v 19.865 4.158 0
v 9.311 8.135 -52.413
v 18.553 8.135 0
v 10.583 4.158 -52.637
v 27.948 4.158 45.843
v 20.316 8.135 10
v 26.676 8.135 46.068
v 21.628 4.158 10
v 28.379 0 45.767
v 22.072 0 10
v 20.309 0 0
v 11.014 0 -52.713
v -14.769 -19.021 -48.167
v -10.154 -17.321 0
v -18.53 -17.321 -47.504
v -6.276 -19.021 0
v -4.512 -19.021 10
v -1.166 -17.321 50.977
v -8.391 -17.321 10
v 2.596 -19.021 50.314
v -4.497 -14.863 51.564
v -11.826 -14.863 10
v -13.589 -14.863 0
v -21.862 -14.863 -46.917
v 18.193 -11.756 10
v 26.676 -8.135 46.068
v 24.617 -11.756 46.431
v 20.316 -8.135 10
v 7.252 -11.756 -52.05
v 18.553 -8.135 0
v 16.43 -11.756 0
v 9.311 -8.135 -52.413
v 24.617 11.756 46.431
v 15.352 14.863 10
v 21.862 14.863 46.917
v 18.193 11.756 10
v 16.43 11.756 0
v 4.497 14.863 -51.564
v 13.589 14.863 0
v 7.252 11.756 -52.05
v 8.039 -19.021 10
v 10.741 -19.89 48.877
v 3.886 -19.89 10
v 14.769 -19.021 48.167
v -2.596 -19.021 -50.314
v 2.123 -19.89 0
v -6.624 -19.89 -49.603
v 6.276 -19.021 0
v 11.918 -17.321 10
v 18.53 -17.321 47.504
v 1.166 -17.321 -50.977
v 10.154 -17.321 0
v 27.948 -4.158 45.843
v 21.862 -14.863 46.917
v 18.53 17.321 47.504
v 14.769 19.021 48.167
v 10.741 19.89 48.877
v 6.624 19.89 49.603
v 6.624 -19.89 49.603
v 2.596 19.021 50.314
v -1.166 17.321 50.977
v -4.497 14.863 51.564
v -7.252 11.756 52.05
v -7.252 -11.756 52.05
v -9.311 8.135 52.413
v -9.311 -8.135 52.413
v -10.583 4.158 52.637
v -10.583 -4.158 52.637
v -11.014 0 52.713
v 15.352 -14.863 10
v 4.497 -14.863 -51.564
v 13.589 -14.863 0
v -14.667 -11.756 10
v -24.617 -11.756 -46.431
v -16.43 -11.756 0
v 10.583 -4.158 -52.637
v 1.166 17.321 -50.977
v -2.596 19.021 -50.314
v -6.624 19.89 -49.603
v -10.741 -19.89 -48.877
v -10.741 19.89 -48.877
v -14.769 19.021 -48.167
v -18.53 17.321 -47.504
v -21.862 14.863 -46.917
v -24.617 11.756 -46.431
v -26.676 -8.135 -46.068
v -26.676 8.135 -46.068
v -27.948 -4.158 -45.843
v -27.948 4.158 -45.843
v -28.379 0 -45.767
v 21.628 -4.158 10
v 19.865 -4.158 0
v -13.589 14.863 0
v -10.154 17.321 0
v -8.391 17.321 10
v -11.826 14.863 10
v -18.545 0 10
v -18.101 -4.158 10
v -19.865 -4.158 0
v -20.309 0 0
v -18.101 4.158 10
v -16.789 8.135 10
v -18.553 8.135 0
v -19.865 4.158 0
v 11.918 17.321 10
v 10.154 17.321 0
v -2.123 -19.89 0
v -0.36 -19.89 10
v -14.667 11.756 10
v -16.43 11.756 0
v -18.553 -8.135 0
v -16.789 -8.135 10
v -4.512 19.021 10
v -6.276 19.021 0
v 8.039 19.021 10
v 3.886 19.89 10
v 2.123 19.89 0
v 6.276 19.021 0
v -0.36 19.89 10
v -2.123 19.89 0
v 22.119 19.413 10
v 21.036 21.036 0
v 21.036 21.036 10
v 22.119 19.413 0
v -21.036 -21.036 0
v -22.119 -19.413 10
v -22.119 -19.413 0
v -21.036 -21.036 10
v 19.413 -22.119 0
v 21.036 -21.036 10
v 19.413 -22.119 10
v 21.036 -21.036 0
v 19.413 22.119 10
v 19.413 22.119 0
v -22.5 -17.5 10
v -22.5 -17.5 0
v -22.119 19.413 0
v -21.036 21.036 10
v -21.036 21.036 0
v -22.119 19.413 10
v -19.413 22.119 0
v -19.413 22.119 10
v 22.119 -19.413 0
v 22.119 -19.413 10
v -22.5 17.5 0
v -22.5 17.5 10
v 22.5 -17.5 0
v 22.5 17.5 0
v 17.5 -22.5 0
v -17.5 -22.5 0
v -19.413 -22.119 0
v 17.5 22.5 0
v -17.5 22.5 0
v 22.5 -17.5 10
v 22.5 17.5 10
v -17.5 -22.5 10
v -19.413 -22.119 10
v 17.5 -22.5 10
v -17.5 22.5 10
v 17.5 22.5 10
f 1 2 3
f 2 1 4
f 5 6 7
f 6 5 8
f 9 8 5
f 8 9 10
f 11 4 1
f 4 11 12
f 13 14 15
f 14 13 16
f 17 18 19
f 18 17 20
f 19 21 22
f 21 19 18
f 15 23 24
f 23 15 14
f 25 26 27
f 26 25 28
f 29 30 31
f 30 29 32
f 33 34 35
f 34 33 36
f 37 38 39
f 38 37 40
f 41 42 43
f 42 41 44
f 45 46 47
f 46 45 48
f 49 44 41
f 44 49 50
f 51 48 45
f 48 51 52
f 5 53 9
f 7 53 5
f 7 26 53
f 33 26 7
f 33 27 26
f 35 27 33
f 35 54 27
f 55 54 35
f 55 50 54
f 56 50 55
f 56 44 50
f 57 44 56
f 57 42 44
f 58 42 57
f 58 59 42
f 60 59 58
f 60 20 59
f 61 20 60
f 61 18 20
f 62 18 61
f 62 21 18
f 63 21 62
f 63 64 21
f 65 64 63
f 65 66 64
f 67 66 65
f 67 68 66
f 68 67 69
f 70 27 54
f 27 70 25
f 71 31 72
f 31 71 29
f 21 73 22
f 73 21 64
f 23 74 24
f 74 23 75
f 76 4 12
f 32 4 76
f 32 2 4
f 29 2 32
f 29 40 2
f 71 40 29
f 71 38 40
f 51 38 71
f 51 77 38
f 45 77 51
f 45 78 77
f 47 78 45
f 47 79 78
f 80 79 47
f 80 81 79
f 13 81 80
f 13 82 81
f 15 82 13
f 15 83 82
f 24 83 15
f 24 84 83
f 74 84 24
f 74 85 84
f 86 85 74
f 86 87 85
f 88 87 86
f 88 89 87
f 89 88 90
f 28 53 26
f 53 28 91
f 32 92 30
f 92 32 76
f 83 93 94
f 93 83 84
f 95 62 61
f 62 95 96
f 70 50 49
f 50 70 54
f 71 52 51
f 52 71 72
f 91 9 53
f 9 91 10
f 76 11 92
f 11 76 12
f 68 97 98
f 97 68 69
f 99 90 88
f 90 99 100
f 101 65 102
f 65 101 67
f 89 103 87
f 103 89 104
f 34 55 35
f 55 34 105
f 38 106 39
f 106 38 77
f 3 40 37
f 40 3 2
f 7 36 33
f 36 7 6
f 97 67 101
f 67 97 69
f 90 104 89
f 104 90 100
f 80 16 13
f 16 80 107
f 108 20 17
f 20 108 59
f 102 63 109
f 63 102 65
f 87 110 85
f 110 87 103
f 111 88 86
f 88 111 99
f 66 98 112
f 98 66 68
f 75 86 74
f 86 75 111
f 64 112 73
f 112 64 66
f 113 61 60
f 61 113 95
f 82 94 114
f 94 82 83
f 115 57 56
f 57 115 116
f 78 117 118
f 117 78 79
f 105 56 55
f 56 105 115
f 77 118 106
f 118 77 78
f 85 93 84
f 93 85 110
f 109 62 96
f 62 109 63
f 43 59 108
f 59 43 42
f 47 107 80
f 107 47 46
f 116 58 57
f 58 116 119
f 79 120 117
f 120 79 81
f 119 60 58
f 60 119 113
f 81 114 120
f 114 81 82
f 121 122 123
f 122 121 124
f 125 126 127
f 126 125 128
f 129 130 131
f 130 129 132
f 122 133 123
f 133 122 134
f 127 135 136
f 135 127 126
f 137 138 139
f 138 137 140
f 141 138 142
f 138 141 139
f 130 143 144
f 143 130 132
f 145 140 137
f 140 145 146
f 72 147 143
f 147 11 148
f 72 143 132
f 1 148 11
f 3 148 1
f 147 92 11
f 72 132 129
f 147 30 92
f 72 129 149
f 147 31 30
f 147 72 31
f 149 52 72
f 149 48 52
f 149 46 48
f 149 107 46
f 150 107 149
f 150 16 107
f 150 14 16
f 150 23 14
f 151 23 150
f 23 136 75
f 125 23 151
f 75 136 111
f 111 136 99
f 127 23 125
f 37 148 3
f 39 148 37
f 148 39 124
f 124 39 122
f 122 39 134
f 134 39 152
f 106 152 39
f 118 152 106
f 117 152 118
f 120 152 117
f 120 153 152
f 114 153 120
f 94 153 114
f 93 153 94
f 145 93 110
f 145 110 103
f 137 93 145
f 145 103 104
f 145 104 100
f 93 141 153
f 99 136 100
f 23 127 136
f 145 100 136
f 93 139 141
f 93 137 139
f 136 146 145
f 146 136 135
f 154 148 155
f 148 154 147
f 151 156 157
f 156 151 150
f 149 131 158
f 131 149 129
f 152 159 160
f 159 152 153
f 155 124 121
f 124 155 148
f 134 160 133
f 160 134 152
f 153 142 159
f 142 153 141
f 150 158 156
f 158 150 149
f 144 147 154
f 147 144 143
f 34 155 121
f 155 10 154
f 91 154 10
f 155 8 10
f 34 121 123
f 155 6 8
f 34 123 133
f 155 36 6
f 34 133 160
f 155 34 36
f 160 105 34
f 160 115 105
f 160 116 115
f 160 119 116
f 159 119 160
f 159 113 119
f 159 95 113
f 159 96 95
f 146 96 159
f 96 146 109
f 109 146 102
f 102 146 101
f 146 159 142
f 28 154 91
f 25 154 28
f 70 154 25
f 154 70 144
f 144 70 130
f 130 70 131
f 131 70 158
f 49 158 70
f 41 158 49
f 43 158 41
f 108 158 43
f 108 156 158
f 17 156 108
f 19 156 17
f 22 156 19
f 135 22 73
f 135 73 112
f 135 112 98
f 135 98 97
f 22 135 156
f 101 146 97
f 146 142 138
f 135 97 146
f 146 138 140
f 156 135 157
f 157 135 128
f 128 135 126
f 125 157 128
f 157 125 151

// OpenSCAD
//cube([50,50,10], center=true);
//translate([0,0,10]) cube([30,30,5], center=true);
module roundedRect(size, radius)
{
x = size[0];
y = size[1];
z = size[2];

linear_extrude(height=z)
hull()
{
    // place 4 circles in the corners, with the given radius
    translate([(-x/2)+(radius/2), (-y/2)+(radius/2), 0])
    circle(r=radius);

    translate([(x/2)-(radius/2), (-y/2)+(radius/2), 0])
    circle(r=radius);

    translate([(-x/2)+(radius/2), (y/2)-(radius/2), 0])
    circle(r=radius);

    translate([(x/2)-(radius/2), (y/2)-(radius/2), 0])
    circle(r=radius);
}

}

color("red", 1.0) roundedRect([40,40,10], 5);

use <MCAD/teardrop.scad>
teardrop(20,100,10);
